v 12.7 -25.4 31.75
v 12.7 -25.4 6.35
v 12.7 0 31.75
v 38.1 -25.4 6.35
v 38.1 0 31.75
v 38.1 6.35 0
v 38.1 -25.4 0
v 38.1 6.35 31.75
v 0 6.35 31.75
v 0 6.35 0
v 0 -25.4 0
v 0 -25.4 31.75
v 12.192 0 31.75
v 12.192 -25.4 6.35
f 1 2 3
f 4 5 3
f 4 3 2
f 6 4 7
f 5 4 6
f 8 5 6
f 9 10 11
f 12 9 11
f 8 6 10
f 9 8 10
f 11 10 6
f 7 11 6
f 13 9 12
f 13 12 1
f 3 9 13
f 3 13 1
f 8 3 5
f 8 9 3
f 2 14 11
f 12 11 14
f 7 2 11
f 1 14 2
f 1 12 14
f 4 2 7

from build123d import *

# Parameters (mm, degrees)
F1_DEPTH = 25.4
F3_DEPTH = 31.75
F5_DEPTH = 25.908


with BuildPart() as f1:
    # F0 (on Front) → F1 (new body)
    with BuildSketch(Plane.XZ):
        Polygon((0, 31.75), (0, 0), (38.1, 0), (38.1, 6.35), (12.7, 6.35), (12.7, 31.75), align=None)
    extrude(amount=F1_DEPTH)

    # F2 (on Top) → F3 (join)
    with BuildSketch(Plane.XY):
        Polygon((0, 6.35), (0, 0), (0, -25.4), (12.7, -25.4), (12.7, 0), (38.1, 0), (38.1, 6.35), align=None)
    extrude(amount=F3_DEPTH)

    # F4 (on face) → F5 (join)
    with BuildSketch(Plane.YZ.offset(38.1)):
        Polygon((0, 31.75), (-25.4, 6.35), (0, 6.35), align=None)
    extrude(amount=-F5_DEPTH)


solid = f1.part
